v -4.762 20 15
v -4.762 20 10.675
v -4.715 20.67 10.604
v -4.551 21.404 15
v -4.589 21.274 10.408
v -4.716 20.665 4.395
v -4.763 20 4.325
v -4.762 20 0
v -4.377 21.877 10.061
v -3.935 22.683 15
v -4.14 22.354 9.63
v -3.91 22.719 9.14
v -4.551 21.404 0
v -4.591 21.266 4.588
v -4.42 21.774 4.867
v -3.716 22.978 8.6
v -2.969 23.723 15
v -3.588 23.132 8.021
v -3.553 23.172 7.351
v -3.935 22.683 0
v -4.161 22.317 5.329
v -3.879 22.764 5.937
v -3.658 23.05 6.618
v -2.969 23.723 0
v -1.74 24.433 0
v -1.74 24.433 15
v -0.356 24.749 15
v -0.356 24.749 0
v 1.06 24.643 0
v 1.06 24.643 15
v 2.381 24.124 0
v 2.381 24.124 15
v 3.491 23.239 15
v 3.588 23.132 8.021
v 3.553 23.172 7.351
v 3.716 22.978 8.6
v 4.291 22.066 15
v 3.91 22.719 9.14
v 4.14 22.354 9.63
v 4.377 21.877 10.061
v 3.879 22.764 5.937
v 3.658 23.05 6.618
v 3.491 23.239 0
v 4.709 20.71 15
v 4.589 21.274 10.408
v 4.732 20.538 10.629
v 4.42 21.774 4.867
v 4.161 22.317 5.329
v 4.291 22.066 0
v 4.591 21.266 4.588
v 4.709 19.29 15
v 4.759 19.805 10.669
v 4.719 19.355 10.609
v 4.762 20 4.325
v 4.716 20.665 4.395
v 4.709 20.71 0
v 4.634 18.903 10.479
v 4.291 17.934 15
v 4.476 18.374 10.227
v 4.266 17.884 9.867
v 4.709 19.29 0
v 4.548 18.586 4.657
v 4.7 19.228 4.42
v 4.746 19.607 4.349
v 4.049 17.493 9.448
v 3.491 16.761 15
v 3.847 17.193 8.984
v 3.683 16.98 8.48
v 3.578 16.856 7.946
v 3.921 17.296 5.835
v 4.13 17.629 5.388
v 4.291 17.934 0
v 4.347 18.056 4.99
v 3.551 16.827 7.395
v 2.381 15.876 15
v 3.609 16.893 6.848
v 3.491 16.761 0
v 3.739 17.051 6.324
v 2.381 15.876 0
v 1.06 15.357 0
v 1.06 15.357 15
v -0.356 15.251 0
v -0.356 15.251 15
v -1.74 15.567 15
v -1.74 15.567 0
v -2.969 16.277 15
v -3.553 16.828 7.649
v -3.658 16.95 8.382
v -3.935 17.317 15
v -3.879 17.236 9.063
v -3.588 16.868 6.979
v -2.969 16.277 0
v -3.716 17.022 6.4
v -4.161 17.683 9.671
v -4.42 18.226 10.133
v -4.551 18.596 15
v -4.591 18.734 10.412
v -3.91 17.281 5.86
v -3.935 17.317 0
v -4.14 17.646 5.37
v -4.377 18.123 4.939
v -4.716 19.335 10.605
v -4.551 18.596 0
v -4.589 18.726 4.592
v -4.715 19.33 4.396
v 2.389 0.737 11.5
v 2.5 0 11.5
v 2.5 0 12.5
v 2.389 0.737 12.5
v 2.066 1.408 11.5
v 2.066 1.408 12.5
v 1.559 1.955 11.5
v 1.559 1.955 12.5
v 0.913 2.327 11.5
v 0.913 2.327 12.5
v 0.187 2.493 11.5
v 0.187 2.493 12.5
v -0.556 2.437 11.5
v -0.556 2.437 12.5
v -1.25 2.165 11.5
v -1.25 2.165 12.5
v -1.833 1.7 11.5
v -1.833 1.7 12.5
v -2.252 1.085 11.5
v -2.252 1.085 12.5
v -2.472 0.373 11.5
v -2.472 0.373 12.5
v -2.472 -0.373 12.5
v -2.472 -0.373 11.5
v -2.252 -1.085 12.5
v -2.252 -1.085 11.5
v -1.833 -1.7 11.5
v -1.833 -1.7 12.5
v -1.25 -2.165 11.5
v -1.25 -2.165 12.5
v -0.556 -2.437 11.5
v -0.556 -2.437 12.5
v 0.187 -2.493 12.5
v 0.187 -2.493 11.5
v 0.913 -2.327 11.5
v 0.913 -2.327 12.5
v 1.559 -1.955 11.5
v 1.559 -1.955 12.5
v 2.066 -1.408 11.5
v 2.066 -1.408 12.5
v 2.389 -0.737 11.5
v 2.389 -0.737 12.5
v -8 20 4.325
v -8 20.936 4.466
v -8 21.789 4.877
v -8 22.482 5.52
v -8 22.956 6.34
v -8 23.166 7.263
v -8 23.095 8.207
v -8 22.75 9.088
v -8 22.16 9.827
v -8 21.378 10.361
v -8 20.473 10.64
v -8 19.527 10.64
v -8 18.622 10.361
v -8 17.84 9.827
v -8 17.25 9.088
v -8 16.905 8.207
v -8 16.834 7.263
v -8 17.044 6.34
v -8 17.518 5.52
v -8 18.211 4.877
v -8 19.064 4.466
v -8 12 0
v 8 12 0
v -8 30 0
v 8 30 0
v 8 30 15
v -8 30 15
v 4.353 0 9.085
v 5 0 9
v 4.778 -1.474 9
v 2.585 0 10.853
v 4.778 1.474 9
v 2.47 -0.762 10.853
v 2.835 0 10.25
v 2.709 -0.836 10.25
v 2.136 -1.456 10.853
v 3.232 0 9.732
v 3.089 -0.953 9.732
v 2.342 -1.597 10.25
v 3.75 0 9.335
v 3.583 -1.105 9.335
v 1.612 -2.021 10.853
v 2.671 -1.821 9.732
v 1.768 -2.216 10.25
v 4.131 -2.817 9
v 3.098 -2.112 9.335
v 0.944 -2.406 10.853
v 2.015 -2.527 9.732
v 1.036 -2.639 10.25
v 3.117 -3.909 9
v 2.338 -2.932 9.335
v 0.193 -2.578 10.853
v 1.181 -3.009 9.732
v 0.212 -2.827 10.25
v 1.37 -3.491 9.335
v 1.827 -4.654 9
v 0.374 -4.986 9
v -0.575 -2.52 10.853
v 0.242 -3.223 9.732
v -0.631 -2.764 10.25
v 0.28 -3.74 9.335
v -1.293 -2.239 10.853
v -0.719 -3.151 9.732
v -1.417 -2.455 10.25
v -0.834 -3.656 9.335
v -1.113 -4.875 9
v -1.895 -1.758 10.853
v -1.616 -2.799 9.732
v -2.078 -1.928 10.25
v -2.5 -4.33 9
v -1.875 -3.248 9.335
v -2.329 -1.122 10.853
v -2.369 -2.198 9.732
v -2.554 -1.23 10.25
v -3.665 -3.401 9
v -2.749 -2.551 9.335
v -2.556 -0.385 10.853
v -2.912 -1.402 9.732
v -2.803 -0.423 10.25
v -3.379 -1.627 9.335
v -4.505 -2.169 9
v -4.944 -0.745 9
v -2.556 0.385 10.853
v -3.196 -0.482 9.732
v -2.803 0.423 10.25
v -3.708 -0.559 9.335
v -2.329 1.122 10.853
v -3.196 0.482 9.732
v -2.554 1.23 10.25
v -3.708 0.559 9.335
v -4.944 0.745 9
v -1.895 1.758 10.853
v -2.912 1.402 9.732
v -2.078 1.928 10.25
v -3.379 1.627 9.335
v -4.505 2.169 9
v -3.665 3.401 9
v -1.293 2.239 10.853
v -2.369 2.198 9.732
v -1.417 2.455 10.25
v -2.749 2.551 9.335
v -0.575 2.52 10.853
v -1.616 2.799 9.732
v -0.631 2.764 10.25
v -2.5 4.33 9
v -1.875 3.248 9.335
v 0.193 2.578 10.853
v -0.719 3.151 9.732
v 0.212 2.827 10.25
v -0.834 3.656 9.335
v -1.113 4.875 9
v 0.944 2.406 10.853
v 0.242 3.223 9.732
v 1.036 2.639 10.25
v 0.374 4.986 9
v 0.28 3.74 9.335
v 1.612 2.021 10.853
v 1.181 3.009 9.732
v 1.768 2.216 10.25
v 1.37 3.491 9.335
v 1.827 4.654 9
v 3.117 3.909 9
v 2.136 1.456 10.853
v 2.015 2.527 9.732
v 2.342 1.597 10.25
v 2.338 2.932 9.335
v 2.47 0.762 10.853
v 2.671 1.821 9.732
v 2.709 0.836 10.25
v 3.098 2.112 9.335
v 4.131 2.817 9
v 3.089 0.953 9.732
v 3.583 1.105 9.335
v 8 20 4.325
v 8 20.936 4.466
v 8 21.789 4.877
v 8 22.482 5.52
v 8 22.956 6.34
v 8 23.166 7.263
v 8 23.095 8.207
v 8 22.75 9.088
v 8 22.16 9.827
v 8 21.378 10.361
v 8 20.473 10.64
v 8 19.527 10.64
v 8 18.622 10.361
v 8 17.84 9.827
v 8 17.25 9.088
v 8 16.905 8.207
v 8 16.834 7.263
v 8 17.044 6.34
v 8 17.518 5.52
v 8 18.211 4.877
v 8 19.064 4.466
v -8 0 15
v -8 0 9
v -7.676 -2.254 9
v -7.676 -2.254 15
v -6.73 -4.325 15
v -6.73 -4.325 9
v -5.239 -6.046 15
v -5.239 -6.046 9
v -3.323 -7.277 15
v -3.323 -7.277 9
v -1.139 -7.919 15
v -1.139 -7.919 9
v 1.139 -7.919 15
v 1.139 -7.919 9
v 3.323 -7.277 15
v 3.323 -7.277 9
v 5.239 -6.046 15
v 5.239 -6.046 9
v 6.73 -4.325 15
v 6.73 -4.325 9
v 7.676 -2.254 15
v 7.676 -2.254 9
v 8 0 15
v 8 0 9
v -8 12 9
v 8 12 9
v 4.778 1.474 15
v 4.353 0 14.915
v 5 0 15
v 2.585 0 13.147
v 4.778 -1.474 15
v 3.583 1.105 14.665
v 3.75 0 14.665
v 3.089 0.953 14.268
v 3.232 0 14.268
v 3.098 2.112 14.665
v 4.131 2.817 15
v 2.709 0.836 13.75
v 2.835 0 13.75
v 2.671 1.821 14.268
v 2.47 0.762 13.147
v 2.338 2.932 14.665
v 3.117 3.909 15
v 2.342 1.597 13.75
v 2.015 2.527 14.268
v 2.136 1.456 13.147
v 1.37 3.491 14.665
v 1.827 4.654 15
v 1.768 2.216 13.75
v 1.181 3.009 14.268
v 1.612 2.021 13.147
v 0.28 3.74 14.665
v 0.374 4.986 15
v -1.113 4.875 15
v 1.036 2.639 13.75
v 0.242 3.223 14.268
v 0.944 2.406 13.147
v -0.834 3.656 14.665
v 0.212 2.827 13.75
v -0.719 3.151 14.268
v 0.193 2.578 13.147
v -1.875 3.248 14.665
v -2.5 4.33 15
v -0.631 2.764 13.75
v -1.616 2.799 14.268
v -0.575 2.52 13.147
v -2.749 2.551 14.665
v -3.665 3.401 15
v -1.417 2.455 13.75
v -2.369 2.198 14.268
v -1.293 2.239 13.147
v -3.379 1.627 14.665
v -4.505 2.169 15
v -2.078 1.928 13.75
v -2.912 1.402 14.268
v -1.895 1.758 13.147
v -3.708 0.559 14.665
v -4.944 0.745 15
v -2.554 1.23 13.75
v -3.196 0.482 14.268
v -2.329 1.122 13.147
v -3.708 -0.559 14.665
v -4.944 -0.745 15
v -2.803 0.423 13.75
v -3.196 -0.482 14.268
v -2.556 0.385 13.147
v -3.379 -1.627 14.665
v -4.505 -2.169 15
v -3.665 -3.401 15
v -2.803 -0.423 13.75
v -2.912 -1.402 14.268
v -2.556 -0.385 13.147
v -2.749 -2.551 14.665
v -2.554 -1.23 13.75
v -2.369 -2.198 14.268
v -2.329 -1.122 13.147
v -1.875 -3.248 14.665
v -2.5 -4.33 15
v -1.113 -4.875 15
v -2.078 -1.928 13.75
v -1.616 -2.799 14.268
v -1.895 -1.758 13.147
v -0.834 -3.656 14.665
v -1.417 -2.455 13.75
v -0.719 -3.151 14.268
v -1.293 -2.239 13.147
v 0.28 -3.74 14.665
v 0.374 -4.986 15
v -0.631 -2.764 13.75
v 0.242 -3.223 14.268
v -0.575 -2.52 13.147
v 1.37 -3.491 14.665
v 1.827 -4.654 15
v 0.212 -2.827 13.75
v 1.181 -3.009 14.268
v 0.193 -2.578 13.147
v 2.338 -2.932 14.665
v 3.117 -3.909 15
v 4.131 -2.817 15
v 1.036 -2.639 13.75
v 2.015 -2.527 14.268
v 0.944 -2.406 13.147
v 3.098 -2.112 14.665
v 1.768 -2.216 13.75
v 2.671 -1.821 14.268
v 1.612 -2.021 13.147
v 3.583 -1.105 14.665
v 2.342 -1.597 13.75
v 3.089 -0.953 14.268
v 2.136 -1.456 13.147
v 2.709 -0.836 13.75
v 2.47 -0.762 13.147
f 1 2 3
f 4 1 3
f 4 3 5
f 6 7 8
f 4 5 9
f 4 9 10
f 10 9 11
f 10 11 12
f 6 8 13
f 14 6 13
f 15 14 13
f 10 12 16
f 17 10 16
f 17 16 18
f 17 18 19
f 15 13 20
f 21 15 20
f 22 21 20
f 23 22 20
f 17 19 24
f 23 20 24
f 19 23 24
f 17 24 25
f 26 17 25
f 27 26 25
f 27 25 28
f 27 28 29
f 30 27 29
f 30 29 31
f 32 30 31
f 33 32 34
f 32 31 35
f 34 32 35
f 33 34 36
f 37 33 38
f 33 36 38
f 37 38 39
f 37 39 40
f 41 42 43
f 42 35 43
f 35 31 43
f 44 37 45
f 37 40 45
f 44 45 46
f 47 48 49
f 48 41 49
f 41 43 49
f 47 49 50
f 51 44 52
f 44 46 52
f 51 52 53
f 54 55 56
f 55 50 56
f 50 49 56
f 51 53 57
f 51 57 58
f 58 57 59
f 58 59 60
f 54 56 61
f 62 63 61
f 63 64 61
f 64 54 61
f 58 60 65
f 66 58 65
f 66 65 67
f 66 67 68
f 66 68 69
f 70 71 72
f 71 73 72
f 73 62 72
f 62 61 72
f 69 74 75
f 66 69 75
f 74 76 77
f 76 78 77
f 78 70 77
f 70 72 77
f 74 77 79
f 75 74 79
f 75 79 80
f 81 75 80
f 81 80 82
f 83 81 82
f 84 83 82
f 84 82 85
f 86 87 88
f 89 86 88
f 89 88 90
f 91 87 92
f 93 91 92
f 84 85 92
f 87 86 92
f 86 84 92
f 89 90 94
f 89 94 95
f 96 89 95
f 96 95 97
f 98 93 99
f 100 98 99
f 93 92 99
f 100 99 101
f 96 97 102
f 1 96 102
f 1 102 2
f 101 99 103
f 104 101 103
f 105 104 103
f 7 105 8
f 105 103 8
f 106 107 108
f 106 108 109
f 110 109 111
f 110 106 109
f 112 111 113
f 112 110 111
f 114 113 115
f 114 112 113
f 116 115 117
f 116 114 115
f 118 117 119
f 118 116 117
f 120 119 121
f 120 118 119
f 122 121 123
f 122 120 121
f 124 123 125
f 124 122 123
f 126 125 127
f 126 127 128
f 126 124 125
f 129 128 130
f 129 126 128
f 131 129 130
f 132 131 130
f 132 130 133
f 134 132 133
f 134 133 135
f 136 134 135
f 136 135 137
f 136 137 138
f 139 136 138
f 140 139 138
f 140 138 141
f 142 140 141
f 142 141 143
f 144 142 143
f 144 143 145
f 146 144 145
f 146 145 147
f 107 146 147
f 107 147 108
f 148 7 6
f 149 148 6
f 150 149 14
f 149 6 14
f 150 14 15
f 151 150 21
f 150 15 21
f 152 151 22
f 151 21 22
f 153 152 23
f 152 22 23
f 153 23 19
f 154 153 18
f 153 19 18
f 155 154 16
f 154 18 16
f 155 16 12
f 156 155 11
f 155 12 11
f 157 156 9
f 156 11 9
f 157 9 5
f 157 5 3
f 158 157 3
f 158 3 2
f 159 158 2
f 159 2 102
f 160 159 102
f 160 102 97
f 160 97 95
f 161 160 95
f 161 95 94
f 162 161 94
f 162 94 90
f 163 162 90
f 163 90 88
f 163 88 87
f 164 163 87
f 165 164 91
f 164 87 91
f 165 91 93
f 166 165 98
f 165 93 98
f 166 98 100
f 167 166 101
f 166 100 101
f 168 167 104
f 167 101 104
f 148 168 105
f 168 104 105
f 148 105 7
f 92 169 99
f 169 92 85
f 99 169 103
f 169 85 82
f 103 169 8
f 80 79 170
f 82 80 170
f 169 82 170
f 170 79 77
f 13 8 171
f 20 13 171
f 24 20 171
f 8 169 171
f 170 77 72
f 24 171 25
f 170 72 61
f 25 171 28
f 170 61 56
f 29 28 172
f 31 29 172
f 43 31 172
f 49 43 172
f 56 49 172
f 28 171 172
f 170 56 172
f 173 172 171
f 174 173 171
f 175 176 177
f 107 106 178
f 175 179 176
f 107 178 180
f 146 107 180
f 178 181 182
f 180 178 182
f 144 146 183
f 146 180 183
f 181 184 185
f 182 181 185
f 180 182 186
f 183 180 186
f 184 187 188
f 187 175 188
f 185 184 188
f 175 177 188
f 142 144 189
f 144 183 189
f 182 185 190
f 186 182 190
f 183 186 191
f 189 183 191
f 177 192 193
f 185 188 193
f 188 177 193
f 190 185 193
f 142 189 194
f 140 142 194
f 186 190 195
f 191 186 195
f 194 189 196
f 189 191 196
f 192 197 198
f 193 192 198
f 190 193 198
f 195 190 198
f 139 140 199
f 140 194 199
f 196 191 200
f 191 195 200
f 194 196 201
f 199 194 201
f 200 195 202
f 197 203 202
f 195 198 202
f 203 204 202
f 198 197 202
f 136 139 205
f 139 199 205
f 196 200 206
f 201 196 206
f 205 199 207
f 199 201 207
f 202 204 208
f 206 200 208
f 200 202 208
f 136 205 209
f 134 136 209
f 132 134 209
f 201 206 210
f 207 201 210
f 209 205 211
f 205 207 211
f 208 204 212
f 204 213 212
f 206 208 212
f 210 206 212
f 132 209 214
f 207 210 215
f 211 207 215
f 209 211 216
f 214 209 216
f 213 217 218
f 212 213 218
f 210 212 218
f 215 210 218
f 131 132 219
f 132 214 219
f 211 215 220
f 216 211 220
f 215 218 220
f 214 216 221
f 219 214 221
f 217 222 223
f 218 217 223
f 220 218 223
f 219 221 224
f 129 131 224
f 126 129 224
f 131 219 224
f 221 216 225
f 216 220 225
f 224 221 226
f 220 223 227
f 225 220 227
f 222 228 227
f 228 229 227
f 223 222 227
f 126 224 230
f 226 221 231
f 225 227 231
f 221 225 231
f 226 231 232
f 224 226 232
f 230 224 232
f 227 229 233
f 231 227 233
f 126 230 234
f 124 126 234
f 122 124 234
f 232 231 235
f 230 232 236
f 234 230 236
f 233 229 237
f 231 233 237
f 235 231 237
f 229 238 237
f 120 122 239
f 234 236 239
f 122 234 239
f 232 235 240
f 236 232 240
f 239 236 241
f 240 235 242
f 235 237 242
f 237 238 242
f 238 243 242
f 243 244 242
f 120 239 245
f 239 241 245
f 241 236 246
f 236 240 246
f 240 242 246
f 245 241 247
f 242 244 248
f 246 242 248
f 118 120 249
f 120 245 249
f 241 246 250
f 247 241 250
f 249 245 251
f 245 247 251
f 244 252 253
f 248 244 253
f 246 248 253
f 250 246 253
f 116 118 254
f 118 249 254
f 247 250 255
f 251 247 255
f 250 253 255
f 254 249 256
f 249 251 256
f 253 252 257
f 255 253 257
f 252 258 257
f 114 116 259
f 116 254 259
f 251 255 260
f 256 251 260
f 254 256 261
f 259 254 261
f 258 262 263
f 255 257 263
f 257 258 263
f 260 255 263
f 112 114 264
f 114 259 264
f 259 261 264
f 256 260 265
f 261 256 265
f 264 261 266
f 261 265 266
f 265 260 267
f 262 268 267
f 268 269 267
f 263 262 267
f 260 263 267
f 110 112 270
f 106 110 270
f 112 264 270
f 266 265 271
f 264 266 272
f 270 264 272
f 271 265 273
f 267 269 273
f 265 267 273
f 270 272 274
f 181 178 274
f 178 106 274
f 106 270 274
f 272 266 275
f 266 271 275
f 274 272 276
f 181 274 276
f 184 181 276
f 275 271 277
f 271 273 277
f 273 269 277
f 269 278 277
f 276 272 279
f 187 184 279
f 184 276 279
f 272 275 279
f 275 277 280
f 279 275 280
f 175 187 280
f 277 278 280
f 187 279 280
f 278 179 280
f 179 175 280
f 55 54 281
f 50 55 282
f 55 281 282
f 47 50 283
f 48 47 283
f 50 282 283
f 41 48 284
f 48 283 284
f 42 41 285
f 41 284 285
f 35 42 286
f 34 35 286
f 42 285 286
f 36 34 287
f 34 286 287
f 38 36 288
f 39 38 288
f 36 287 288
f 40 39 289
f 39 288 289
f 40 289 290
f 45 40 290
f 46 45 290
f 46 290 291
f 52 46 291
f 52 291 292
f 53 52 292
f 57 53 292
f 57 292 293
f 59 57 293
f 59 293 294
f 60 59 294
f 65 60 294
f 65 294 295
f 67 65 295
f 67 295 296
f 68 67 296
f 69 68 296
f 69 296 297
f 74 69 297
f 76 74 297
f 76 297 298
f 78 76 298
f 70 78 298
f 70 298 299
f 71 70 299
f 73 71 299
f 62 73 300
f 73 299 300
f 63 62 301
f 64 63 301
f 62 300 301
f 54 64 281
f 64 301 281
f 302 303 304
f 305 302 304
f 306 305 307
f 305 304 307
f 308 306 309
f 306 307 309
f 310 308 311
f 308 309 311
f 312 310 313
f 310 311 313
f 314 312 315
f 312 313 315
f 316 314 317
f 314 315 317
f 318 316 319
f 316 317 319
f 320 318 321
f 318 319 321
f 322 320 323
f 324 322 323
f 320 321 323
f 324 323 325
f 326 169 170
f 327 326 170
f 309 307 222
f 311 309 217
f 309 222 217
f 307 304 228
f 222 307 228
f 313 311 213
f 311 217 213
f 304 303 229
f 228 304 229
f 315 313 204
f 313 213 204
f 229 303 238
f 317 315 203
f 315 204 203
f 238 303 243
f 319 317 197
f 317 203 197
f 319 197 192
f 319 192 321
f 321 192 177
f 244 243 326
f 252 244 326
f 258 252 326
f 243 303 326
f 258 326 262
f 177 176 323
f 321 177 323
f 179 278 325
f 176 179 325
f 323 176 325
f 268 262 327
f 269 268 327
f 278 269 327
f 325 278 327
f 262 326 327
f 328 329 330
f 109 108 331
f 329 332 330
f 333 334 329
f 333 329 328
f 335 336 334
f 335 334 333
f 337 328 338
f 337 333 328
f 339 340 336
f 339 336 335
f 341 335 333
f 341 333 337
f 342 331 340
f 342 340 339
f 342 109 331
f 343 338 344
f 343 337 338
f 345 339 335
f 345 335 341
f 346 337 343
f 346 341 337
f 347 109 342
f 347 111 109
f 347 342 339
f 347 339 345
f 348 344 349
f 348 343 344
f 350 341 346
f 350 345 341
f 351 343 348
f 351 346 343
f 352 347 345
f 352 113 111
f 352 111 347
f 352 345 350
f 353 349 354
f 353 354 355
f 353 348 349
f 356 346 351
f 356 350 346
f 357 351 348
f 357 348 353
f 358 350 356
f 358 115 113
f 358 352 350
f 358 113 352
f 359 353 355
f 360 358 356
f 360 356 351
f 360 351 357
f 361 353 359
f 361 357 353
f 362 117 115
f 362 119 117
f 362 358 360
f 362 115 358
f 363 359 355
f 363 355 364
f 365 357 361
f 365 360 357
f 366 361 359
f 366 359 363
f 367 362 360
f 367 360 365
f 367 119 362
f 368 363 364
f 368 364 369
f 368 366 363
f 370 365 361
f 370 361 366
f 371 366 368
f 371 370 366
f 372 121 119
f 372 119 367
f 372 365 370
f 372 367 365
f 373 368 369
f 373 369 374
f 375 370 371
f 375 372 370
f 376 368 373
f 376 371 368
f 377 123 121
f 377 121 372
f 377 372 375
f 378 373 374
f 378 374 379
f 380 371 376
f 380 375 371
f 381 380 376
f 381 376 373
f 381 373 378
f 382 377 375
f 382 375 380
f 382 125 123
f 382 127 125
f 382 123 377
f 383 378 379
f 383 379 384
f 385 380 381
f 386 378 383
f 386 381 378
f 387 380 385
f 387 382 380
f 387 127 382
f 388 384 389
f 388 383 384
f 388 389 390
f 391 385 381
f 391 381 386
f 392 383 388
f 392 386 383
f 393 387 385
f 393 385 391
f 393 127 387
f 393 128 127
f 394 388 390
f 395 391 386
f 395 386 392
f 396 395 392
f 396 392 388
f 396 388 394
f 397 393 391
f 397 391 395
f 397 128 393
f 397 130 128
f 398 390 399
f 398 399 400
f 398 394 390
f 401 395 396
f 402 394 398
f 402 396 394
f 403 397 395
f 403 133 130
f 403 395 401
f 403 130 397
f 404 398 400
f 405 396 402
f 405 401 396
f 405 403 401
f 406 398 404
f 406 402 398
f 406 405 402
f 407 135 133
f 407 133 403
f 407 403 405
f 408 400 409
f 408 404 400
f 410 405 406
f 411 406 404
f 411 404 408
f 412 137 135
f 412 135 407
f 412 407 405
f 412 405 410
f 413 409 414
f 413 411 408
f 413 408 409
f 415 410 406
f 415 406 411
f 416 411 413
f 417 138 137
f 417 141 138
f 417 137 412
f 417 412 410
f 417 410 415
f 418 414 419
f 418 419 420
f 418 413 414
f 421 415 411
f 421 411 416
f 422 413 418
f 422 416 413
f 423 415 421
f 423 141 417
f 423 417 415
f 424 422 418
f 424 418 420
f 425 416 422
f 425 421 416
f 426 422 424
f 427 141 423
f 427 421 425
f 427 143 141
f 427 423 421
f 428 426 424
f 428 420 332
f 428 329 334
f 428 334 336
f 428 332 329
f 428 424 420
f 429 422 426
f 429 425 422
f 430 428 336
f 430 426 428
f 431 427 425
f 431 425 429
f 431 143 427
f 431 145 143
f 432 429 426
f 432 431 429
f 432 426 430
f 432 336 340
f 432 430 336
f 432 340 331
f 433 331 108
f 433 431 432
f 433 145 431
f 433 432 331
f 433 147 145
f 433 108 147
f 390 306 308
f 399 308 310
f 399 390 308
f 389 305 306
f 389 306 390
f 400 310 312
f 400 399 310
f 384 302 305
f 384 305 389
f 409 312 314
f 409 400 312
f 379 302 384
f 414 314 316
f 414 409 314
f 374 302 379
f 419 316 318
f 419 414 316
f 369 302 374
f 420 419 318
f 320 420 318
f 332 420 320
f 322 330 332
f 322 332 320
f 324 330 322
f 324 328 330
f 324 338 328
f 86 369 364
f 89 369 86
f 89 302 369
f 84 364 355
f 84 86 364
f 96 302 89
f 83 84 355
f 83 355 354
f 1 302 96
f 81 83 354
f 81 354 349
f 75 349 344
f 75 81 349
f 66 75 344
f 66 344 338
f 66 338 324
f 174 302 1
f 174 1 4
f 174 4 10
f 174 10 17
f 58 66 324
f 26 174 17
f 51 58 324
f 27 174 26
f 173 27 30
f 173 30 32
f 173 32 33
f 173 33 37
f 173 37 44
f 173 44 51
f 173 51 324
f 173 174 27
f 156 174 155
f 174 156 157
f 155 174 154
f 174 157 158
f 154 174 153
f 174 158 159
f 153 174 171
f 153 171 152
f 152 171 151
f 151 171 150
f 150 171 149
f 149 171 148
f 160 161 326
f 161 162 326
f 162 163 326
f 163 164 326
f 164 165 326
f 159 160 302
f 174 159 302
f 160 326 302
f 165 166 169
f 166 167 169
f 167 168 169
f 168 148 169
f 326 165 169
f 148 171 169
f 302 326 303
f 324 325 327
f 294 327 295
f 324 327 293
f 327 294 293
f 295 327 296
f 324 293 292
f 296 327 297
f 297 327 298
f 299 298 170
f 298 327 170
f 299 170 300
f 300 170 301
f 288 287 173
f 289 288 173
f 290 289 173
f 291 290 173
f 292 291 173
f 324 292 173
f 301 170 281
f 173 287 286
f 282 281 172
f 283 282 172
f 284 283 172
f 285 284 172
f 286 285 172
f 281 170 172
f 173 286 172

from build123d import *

# Parameters (mm, degrees)
SKETCH1_R                  = 2.5
BOSS_EXTRUDE1_DEPTH        = 15
SKETCH6_W                  = 16
SKETCH6_H                  = 20
CUT_EXTRUDE1_DEPTH         = 9
FILLET1_R                  = 2.5
F_3_8_0_3750_DOWEL_HOLE1_D = 9.525
F_1_4_0_2500_DOWEL_HOLE2_D = 6.35


with BuildPart() as part:
    # Sketch1 → Boss-Extrude1 (new body)
    with BuildSketch(Plane.XY):
        with BuildLine():
            Line((-8, 12), (-8, 0))
            ThreePointArc((-8, 0), (0, -8), (8, 0))
            Line((8, 0), (8, 12))
            Line((8, 12), (8, 30))
            Line((8, 30), (-8, 30))
            Line((-8, 30), (-8, 12))
        make_face()
        Circle(SKETCH1_R, mode=Mode.SUBTRACT)
    extrude(amount=BOSS_EXTRUDE1_DEPTH)

    # Sketch6 → Cut-Extrude1 (cut)
    with BuildSketch(Plane.XY):
        with Locations((0, 2)):
            Rectangle(SKETCH6_W, SKETCH6_H)
    extrude(amount=CUT_EXTRUDE1_DEPTH, mode=Mode.SUBTRACT)

    # Fillet1
    fillet1_edges = [part.edges().sort_by_distance(p)[0] for p in [
        (-2.5, 0, 15),
        (-2.5, 0, 9),
    ]]
    fillet(fillet1_edges, radius=FILLET1_R)

    # 3/8 (0.3750) Dowel Hole1 (through all)
    with Locations(Plane.XY.offset(15)):
        with Locations((0, 20)):
            Hole(F_3_8_0_3750_DOWEL_HOLE1_D / 2)

    # 1/4 (0.2500) Dowel Hole2 (through all)
    with Locations(Plane.ZY.offset(8)):
        with Locations((7.5, 20)):
            Hole(F_1_4_0_2500_DOWEL_HOLE2_D / 2)


solid = part.part
